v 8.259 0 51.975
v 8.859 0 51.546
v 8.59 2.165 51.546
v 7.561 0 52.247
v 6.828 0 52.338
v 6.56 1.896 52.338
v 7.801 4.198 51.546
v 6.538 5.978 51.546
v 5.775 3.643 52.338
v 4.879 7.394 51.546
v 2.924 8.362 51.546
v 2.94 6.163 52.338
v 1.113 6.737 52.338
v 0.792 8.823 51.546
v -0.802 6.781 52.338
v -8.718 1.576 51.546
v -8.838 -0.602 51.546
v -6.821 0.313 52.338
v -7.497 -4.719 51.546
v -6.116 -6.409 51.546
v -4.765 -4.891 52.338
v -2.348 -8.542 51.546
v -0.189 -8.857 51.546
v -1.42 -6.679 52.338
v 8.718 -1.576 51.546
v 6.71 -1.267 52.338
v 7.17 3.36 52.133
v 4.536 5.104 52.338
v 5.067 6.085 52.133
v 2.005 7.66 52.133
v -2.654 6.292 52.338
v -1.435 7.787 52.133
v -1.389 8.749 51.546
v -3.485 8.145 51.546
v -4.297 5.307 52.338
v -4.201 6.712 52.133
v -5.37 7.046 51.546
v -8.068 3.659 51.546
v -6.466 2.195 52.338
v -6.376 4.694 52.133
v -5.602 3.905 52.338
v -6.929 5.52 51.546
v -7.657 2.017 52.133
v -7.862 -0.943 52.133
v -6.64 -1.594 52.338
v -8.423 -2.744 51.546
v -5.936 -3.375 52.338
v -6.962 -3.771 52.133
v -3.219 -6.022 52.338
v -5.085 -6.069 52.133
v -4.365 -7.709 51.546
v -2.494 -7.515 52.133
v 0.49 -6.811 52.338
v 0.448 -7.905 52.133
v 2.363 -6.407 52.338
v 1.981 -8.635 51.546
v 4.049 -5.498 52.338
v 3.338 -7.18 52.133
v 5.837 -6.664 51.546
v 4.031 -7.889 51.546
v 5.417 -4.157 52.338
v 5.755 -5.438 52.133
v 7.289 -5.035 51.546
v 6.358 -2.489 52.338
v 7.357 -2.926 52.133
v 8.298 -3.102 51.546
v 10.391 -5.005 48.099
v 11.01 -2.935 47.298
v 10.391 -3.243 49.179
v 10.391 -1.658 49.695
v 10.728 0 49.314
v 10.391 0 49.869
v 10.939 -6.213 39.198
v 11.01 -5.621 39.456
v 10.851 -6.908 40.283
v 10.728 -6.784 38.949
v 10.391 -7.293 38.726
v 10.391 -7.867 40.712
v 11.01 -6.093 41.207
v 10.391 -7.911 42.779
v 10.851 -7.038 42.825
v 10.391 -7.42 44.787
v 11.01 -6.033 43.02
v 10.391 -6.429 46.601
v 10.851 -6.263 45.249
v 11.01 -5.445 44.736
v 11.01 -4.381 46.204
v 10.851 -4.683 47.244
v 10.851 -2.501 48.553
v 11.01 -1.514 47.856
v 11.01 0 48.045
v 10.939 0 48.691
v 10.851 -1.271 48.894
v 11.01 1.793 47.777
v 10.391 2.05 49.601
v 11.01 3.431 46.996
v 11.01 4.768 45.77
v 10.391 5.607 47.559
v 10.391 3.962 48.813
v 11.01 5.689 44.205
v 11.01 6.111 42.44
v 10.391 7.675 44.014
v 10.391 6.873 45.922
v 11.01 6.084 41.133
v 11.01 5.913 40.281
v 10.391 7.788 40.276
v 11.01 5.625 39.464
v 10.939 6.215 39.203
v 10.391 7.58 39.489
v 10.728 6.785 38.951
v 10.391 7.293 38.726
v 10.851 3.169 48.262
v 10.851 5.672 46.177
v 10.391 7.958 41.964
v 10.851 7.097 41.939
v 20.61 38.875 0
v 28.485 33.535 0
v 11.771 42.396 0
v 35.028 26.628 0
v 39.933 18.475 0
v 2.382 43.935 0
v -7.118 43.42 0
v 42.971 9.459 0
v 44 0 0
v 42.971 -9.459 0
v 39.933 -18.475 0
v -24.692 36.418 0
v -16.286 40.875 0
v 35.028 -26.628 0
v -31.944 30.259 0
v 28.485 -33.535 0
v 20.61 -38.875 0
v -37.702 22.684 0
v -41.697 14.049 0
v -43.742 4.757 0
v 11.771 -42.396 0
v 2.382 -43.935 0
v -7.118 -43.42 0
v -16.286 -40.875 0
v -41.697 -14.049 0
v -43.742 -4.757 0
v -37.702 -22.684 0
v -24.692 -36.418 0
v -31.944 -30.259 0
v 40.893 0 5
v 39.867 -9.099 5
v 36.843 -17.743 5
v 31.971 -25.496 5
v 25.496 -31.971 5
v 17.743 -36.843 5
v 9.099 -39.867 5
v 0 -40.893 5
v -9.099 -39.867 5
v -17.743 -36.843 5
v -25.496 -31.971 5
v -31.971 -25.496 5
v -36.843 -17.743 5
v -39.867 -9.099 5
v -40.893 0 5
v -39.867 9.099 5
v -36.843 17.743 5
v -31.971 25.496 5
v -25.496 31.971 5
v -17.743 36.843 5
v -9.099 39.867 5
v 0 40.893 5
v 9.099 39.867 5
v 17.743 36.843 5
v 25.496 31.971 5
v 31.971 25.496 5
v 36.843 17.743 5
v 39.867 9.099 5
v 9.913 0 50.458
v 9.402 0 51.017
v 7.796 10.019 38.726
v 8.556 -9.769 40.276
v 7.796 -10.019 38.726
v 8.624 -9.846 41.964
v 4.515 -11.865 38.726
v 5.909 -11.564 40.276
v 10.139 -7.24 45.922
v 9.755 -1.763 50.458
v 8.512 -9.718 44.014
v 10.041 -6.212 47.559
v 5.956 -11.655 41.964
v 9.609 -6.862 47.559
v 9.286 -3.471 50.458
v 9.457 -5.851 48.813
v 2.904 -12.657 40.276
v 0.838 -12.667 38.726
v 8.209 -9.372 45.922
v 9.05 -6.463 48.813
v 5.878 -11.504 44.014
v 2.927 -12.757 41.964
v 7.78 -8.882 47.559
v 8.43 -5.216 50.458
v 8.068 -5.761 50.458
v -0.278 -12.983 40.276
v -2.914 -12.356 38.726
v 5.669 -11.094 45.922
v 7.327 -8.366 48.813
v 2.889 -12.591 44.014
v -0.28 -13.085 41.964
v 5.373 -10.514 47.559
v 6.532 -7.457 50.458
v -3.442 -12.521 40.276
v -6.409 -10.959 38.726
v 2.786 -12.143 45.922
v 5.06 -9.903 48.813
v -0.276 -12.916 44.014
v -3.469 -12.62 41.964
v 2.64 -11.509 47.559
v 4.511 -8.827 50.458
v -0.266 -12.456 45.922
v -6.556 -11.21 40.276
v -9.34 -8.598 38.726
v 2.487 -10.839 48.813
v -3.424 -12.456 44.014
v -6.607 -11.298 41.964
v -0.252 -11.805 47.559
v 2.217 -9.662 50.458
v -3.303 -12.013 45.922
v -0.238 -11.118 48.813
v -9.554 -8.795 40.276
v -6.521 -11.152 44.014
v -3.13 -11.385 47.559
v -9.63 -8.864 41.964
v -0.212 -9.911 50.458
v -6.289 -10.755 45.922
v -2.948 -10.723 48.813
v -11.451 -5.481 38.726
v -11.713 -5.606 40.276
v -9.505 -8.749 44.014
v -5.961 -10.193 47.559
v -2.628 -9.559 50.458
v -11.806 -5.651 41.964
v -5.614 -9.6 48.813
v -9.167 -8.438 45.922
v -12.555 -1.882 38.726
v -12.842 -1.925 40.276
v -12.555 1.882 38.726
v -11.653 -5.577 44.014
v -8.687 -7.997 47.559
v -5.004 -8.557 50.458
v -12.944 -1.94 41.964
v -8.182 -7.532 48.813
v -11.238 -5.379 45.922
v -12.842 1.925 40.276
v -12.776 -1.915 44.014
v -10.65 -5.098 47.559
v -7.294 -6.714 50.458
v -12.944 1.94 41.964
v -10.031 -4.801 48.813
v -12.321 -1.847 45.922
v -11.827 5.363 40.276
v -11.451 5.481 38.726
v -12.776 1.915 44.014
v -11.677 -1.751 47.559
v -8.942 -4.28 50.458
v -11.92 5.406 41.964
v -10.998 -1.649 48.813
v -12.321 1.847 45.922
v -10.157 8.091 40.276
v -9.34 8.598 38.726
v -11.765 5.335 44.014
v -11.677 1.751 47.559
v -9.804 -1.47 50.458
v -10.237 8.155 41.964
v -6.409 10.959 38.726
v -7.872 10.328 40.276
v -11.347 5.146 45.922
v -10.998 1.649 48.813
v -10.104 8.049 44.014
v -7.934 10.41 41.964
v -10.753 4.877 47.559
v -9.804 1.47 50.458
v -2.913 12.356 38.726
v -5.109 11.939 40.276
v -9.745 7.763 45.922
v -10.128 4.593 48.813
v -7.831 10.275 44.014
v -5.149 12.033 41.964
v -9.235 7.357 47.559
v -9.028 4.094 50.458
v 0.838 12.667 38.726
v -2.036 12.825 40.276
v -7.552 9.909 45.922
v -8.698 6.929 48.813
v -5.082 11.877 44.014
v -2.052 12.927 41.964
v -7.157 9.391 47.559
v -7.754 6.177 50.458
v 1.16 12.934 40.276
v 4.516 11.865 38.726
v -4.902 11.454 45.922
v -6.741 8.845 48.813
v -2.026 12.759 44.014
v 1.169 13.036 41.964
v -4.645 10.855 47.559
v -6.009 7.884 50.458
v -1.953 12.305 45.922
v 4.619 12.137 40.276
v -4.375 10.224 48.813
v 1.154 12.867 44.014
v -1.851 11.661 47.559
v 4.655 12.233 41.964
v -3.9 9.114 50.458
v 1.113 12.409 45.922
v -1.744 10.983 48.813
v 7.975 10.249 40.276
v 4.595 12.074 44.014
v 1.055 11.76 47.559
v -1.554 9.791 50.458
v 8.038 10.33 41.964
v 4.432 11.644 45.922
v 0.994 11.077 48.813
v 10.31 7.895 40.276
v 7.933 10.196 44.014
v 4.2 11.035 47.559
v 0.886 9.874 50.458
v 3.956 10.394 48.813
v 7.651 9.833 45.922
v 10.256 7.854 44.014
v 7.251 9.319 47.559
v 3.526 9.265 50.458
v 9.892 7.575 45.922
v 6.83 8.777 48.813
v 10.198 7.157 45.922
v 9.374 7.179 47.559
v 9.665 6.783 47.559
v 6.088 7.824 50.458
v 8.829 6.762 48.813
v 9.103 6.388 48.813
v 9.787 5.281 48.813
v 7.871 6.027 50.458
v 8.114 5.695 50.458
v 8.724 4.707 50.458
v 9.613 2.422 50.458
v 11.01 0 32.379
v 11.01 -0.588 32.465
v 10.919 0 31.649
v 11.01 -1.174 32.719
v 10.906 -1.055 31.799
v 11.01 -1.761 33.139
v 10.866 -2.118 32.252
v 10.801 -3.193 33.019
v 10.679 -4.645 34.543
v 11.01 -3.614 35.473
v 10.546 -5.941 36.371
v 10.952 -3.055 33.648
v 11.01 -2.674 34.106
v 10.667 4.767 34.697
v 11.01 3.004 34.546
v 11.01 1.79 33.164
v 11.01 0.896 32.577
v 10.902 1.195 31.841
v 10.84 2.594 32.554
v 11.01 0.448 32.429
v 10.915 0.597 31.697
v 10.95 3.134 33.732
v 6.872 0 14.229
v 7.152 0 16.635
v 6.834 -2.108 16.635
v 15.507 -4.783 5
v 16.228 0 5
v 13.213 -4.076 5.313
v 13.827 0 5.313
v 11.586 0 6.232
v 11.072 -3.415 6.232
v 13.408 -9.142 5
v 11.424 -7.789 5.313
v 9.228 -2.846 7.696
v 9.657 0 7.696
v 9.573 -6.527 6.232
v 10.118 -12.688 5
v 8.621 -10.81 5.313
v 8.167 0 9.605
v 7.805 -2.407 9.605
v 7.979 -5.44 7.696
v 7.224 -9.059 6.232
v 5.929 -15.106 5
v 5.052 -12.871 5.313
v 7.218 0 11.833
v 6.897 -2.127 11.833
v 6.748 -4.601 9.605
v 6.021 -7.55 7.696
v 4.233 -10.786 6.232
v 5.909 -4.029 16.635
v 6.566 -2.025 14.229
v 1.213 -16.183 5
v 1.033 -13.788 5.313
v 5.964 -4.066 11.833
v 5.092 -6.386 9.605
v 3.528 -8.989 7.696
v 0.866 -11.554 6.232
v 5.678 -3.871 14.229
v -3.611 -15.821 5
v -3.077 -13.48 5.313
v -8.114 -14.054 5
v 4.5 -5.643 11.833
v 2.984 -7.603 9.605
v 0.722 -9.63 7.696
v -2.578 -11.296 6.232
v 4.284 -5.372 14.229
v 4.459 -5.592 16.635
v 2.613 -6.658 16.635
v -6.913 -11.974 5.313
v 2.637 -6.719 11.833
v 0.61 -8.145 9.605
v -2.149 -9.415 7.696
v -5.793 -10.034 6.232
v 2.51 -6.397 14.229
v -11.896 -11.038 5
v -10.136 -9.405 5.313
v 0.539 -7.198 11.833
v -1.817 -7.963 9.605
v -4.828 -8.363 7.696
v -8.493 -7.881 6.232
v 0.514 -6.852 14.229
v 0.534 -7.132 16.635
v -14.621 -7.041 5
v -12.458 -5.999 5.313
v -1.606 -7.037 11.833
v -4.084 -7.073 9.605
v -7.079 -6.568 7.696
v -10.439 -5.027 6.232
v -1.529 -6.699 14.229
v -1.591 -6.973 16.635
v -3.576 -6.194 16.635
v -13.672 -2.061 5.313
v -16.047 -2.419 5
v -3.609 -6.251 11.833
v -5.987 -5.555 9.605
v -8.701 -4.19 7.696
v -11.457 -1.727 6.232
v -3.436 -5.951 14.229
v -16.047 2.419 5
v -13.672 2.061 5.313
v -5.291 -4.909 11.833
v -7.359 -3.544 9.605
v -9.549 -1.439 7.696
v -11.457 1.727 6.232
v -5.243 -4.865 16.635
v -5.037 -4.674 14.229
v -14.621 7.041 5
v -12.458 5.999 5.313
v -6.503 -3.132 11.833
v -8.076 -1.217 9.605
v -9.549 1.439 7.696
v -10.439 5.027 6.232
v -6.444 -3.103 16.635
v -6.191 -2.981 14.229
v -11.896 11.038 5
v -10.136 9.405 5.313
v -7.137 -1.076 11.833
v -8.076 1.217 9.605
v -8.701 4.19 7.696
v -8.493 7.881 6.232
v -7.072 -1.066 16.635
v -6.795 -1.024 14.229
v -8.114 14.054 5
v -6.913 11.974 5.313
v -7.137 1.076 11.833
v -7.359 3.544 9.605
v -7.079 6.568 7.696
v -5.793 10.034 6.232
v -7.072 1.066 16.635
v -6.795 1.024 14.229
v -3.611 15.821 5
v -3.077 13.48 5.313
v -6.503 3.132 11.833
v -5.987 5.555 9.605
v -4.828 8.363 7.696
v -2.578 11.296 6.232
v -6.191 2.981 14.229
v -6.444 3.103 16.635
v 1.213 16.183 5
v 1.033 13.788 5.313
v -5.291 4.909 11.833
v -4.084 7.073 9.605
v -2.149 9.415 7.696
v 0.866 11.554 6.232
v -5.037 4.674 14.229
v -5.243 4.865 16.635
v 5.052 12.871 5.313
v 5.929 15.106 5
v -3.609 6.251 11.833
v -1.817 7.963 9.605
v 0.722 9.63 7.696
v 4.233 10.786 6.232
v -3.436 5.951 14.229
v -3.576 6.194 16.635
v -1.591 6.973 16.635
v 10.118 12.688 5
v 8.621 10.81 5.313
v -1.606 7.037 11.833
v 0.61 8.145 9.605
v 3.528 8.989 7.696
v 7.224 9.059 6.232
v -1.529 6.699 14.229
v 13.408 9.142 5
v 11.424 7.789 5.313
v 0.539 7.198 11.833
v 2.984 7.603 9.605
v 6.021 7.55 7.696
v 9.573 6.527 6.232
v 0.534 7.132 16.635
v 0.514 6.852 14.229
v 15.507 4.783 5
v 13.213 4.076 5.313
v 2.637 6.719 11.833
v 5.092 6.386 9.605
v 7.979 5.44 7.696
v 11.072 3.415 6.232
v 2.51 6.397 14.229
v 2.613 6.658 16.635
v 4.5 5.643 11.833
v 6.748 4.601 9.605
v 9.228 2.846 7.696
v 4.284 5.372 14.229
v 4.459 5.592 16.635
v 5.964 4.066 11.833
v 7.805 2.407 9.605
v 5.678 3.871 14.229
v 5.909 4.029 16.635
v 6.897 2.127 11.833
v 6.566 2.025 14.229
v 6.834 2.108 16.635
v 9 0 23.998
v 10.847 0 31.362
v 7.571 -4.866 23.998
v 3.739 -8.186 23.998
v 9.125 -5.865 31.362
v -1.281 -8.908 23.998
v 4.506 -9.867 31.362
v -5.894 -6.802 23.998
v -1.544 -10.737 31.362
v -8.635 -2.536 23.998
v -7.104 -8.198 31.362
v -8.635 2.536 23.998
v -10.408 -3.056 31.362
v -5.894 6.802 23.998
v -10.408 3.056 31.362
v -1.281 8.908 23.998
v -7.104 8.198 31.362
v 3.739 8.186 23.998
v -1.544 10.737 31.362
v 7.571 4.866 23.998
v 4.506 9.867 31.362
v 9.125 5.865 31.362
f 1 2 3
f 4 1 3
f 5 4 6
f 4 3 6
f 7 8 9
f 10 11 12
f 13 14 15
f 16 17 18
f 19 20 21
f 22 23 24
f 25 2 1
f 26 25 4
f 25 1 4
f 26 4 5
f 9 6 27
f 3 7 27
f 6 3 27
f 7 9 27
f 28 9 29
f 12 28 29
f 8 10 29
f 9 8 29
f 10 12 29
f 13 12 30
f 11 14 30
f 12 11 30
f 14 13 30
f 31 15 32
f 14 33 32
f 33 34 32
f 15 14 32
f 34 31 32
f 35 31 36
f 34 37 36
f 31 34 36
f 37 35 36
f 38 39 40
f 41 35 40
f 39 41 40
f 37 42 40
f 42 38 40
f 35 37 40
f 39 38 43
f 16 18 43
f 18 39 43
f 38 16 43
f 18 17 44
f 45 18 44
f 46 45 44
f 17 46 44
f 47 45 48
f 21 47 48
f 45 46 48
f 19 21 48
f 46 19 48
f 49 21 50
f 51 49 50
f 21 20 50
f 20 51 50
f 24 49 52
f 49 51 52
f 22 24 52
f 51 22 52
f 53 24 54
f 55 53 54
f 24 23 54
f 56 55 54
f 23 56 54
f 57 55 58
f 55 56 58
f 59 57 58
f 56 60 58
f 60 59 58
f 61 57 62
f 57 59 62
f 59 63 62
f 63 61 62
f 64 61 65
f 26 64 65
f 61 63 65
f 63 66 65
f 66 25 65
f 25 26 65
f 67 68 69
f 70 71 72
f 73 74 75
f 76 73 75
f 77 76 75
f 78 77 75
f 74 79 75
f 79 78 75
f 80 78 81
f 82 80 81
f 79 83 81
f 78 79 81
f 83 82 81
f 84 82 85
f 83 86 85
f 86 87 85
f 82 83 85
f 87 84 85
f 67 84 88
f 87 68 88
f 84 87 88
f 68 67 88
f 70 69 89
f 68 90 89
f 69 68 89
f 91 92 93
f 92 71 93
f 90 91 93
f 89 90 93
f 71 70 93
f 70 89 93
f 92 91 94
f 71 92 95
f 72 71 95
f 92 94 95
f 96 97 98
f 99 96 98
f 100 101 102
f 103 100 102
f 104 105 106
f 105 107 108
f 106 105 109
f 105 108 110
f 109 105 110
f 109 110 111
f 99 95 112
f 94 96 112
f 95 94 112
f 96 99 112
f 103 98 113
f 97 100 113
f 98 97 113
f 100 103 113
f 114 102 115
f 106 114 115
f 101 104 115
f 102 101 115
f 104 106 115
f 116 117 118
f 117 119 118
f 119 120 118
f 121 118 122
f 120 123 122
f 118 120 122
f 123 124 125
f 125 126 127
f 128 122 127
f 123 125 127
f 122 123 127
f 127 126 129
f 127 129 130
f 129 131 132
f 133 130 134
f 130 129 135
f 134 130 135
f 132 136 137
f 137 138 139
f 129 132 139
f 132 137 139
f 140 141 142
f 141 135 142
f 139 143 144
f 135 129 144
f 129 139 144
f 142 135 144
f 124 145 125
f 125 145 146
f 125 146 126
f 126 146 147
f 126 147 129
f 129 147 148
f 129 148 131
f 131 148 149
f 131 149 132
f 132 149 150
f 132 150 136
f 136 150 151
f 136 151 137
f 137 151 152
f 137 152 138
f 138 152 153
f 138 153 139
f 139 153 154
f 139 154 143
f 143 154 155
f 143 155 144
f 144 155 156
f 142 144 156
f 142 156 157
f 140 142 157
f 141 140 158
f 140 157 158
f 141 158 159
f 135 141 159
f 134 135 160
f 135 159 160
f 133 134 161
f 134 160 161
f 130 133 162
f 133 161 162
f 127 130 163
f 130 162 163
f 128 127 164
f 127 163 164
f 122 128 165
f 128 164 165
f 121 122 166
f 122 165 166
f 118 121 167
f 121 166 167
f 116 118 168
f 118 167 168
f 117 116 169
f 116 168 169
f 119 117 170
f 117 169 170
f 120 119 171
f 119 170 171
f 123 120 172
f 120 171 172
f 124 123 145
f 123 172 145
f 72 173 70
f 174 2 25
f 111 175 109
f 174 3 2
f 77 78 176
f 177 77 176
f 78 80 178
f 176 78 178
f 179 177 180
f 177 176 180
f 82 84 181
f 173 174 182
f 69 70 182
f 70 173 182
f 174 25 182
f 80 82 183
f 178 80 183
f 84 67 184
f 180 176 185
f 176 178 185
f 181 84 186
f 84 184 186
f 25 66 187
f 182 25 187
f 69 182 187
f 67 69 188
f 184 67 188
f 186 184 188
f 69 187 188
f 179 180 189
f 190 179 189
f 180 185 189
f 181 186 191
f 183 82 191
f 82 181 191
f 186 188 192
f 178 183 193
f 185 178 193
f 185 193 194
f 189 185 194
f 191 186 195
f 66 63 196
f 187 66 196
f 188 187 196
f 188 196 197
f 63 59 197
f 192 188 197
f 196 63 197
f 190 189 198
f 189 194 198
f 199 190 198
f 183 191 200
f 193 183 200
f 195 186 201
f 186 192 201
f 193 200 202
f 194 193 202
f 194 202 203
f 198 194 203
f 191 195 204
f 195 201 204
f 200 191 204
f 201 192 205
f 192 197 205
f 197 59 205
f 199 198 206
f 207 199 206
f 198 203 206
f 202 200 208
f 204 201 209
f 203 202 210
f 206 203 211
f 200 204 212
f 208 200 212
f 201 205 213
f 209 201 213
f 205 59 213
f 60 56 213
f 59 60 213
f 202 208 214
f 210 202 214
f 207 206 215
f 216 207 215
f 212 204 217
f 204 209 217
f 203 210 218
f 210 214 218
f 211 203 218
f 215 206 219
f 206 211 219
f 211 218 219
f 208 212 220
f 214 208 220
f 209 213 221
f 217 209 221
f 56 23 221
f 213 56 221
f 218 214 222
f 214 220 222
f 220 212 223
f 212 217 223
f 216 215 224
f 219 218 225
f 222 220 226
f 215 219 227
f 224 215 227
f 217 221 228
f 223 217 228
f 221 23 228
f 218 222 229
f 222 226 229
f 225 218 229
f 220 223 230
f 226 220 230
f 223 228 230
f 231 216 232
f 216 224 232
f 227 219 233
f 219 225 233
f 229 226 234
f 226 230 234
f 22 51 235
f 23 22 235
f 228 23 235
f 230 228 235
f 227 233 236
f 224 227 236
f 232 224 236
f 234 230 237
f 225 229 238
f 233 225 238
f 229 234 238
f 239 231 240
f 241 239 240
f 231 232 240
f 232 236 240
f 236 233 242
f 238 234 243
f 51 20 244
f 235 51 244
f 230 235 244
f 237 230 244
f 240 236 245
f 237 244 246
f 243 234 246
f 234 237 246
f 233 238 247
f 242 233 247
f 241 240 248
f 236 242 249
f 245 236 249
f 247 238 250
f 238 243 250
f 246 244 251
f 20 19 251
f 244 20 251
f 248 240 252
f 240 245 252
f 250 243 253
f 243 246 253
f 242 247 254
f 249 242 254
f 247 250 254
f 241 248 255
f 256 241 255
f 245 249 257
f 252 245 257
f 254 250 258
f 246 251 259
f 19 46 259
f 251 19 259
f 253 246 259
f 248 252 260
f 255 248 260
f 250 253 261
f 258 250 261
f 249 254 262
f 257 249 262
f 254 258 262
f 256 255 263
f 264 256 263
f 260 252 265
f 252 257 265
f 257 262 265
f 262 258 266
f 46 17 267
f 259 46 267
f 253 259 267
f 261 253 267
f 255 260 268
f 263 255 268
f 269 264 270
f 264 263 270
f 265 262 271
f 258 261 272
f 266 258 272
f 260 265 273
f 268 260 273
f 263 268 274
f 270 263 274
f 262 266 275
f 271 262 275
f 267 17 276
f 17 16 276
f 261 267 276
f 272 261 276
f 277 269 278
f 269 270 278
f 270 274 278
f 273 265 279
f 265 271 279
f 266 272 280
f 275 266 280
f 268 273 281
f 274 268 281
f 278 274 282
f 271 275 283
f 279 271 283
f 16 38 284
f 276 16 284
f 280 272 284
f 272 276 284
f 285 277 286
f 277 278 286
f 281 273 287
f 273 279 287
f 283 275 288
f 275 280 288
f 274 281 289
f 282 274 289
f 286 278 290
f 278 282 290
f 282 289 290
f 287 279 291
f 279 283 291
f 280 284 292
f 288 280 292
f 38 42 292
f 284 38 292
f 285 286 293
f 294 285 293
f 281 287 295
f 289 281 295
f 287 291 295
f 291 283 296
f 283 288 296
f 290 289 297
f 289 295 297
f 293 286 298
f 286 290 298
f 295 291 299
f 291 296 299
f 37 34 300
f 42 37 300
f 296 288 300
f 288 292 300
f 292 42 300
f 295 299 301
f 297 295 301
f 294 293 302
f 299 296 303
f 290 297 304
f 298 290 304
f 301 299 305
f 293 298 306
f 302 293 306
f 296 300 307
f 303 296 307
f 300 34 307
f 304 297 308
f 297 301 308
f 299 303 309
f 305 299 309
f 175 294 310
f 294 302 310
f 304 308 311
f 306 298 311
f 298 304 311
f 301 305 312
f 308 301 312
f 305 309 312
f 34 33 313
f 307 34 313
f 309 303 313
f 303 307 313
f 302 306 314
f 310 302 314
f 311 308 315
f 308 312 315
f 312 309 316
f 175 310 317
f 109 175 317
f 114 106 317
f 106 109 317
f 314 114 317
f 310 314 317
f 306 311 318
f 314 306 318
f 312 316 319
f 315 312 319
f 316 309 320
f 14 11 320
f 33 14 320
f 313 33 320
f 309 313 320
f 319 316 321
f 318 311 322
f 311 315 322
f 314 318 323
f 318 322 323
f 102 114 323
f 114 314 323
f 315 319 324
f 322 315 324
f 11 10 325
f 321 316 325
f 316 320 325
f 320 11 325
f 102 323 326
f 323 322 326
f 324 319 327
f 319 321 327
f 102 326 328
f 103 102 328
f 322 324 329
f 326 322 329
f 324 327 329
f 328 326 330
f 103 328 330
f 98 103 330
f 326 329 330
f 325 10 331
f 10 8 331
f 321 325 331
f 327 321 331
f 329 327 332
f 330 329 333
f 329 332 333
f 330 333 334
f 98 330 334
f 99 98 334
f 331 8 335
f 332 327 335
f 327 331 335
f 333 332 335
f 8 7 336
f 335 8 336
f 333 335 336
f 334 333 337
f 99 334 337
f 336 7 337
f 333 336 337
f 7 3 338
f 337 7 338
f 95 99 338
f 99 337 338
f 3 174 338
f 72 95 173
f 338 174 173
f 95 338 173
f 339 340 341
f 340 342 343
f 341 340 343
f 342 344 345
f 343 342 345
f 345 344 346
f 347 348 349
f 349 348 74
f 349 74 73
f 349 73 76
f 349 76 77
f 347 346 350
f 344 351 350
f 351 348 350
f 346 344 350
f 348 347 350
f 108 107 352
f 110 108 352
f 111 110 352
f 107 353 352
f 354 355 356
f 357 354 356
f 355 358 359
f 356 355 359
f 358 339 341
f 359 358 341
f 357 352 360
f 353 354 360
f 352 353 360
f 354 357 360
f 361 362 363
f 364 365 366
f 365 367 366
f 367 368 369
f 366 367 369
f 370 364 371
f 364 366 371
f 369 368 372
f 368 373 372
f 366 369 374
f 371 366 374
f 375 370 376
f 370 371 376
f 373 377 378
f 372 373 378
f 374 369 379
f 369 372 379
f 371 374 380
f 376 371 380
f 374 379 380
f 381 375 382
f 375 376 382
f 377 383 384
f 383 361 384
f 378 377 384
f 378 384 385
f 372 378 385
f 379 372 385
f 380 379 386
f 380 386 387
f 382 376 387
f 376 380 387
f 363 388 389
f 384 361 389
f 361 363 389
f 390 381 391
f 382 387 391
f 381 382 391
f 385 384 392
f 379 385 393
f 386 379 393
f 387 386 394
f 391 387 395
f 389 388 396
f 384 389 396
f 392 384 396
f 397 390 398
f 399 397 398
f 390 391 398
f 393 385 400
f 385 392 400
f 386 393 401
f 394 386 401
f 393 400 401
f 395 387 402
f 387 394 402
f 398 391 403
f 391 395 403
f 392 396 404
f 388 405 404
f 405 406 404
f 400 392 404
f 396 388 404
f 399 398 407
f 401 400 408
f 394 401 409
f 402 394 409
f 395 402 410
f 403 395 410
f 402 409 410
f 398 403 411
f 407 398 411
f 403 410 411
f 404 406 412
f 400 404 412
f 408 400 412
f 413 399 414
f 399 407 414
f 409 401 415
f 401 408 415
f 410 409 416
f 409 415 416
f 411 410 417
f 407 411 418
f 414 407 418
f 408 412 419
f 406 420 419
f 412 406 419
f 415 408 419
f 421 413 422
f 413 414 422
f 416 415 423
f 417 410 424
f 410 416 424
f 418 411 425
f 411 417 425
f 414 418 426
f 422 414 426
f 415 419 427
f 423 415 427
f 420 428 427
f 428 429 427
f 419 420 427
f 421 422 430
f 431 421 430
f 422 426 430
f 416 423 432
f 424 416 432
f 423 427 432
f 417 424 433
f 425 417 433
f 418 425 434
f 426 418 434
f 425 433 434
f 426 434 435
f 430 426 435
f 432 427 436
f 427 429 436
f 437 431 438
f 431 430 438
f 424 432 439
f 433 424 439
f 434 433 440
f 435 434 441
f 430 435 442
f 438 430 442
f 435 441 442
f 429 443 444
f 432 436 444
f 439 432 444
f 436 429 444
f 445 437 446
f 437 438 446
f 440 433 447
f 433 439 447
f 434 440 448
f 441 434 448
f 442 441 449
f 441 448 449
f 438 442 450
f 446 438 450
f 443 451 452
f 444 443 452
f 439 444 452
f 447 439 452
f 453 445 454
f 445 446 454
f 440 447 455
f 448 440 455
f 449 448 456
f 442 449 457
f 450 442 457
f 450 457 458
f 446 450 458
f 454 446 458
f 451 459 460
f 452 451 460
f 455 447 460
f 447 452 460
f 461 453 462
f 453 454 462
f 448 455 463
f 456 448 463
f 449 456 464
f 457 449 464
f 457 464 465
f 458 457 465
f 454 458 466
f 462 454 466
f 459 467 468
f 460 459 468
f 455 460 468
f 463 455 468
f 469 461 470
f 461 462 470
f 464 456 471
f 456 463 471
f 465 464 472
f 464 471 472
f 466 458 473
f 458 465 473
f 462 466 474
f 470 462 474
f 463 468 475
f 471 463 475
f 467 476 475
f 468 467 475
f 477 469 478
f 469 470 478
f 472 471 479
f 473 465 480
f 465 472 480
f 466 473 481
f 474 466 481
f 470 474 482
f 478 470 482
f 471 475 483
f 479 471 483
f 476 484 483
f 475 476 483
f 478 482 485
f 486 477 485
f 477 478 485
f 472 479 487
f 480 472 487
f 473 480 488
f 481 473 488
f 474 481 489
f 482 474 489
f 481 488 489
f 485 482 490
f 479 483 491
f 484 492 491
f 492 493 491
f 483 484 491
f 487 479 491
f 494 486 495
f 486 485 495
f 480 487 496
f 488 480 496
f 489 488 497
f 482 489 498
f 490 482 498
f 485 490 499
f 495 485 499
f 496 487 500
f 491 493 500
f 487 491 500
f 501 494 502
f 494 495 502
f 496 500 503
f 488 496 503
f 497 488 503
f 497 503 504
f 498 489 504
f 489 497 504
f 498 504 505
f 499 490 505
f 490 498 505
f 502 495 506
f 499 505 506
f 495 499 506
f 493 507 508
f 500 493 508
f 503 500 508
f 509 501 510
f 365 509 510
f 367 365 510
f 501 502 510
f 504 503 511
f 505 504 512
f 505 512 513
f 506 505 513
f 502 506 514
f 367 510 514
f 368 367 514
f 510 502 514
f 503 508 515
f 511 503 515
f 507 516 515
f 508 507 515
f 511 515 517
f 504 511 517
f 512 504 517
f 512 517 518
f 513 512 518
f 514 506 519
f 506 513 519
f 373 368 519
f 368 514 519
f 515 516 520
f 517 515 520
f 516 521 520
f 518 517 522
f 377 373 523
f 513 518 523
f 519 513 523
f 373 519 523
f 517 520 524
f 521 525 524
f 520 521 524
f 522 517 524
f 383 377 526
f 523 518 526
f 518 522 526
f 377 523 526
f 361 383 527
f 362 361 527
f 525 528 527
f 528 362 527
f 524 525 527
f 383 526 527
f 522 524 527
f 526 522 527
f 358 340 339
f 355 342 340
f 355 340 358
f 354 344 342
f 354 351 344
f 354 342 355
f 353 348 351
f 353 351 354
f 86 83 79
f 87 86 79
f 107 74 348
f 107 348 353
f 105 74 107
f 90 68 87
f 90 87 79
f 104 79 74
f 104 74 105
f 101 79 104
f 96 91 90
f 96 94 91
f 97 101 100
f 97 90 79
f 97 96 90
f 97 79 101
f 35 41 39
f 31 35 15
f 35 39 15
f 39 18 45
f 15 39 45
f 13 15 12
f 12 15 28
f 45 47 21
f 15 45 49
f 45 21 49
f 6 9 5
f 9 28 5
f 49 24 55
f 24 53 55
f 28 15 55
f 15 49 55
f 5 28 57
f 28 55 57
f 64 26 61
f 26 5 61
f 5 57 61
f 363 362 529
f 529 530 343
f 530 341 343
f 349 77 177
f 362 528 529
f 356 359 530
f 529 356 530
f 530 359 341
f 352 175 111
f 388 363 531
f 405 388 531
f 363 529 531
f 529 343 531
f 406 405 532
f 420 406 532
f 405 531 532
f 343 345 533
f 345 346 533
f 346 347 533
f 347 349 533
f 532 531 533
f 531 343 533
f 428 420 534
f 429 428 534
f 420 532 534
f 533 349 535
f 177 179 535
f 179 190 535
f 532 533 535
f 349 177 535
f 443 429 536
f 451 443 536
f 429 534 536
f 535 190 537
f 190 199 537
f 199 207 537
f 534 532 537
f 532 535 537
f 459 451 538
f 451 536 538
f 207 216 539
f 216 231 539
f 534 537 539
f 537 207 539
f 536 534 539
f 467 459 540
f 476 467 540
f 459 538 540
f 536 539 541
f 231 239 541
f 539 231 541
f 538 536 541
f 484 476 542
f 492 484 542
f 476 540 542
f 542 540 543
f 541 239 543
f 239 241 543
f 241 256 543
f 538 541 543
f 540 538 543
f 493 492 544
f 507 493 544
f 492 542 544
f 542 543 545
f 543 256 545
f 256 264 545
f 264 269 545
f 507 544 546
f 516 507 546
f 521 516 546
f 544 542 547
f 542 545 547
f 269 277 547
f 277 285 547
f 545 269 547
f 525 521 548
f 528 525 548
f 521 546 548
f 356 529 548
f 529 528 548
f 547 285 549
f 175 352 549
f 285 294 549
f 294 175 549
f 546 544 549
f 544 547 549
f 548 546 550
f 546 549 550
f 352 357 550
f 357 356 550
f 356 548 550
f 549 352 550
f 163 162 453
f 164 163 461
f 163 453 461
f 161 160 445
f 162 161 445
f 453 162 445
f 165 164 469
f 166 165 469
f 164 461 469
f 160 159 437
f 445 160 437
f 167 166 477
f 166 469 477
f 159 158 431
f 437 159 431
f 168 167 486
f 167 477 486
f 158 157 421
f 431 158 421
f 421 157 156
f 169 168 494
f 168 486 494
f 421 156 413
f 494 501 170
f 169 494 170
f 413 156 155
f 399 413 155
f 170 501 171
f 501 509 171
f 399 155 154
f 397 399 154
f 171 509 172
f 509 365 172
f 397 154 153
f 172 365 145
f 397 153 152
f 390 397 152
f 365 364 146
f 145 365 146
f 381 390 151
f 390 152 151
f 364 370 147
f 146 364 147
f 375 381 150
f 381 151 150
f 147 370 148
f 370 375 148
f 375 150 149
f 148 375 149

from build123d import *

# Parameters (mm, degrees)
F3_W     = 13.993276
F3_H     = 39.785632
F4_DEPTH = 25
F5_W     = 45.990731
F5_H     = 9.154398
F6_DEPTH = 12.5
F7_R     = 3


with BuildPart() as f1:
    # F0 (on Front) → F1 (revolve)
    with BuildSketch(Plane.XZ):
        with BuildLine():
            Line((0, 55), (0, 0))
            Line((0, 0), (44, 0))
            Line((44, 0), (40.892728, 5))
            Line((40.892728, 5), (16.228148, 5))
            ThreePointArc((16.228148, 5), (8.850146, 8.601889), (7.152097, 16.634642))
            Line((7.152097, 16.634642), (12.695047, 38.726145))
            ThreePointArc((12.695047, 38.726145), (10.319915, 49.961889), (0, 55))
        make_face()
    revolve(axis=Axis((0, 0, 14.176942), (0, 0, -1)))

    # F3 (on offset) → F4 (cut)
    with BuildSketch(Plane.XY.offset(56)):
        with Locations((18.006259, -3.923812)):
            Rectangle(F3_W, F3_H)
    extrude(amount=-F4_DEPTH, mode=Mode.SUBTRACT)

    # F5 (on Front) → F6 (cut, symmetric)
    with BuildSketch(Plane.XZ):
        with Locations((6.243711, 56.915106)):
            Rectangle(F5_W, F5_H)
    extrude(amount=F6_DEPTH, both=True, mode=Mode.SUBTRACT)

    # F7
    f7_edges = [f1.edges().sort_by_distance(p)[0] for p in [
        (-7.911964, 0, 52.337907),
        (11.009621, -6.026784, 45.623109),
        (11.009621, 6.026784, 45.623109),
        (11.009621, -3.847165, 34.610661),
        (11.009621, 3.847165, 34.610661),
    ]]
    fillet(f7_edges, radius=F7_R)


solid = f1.part
